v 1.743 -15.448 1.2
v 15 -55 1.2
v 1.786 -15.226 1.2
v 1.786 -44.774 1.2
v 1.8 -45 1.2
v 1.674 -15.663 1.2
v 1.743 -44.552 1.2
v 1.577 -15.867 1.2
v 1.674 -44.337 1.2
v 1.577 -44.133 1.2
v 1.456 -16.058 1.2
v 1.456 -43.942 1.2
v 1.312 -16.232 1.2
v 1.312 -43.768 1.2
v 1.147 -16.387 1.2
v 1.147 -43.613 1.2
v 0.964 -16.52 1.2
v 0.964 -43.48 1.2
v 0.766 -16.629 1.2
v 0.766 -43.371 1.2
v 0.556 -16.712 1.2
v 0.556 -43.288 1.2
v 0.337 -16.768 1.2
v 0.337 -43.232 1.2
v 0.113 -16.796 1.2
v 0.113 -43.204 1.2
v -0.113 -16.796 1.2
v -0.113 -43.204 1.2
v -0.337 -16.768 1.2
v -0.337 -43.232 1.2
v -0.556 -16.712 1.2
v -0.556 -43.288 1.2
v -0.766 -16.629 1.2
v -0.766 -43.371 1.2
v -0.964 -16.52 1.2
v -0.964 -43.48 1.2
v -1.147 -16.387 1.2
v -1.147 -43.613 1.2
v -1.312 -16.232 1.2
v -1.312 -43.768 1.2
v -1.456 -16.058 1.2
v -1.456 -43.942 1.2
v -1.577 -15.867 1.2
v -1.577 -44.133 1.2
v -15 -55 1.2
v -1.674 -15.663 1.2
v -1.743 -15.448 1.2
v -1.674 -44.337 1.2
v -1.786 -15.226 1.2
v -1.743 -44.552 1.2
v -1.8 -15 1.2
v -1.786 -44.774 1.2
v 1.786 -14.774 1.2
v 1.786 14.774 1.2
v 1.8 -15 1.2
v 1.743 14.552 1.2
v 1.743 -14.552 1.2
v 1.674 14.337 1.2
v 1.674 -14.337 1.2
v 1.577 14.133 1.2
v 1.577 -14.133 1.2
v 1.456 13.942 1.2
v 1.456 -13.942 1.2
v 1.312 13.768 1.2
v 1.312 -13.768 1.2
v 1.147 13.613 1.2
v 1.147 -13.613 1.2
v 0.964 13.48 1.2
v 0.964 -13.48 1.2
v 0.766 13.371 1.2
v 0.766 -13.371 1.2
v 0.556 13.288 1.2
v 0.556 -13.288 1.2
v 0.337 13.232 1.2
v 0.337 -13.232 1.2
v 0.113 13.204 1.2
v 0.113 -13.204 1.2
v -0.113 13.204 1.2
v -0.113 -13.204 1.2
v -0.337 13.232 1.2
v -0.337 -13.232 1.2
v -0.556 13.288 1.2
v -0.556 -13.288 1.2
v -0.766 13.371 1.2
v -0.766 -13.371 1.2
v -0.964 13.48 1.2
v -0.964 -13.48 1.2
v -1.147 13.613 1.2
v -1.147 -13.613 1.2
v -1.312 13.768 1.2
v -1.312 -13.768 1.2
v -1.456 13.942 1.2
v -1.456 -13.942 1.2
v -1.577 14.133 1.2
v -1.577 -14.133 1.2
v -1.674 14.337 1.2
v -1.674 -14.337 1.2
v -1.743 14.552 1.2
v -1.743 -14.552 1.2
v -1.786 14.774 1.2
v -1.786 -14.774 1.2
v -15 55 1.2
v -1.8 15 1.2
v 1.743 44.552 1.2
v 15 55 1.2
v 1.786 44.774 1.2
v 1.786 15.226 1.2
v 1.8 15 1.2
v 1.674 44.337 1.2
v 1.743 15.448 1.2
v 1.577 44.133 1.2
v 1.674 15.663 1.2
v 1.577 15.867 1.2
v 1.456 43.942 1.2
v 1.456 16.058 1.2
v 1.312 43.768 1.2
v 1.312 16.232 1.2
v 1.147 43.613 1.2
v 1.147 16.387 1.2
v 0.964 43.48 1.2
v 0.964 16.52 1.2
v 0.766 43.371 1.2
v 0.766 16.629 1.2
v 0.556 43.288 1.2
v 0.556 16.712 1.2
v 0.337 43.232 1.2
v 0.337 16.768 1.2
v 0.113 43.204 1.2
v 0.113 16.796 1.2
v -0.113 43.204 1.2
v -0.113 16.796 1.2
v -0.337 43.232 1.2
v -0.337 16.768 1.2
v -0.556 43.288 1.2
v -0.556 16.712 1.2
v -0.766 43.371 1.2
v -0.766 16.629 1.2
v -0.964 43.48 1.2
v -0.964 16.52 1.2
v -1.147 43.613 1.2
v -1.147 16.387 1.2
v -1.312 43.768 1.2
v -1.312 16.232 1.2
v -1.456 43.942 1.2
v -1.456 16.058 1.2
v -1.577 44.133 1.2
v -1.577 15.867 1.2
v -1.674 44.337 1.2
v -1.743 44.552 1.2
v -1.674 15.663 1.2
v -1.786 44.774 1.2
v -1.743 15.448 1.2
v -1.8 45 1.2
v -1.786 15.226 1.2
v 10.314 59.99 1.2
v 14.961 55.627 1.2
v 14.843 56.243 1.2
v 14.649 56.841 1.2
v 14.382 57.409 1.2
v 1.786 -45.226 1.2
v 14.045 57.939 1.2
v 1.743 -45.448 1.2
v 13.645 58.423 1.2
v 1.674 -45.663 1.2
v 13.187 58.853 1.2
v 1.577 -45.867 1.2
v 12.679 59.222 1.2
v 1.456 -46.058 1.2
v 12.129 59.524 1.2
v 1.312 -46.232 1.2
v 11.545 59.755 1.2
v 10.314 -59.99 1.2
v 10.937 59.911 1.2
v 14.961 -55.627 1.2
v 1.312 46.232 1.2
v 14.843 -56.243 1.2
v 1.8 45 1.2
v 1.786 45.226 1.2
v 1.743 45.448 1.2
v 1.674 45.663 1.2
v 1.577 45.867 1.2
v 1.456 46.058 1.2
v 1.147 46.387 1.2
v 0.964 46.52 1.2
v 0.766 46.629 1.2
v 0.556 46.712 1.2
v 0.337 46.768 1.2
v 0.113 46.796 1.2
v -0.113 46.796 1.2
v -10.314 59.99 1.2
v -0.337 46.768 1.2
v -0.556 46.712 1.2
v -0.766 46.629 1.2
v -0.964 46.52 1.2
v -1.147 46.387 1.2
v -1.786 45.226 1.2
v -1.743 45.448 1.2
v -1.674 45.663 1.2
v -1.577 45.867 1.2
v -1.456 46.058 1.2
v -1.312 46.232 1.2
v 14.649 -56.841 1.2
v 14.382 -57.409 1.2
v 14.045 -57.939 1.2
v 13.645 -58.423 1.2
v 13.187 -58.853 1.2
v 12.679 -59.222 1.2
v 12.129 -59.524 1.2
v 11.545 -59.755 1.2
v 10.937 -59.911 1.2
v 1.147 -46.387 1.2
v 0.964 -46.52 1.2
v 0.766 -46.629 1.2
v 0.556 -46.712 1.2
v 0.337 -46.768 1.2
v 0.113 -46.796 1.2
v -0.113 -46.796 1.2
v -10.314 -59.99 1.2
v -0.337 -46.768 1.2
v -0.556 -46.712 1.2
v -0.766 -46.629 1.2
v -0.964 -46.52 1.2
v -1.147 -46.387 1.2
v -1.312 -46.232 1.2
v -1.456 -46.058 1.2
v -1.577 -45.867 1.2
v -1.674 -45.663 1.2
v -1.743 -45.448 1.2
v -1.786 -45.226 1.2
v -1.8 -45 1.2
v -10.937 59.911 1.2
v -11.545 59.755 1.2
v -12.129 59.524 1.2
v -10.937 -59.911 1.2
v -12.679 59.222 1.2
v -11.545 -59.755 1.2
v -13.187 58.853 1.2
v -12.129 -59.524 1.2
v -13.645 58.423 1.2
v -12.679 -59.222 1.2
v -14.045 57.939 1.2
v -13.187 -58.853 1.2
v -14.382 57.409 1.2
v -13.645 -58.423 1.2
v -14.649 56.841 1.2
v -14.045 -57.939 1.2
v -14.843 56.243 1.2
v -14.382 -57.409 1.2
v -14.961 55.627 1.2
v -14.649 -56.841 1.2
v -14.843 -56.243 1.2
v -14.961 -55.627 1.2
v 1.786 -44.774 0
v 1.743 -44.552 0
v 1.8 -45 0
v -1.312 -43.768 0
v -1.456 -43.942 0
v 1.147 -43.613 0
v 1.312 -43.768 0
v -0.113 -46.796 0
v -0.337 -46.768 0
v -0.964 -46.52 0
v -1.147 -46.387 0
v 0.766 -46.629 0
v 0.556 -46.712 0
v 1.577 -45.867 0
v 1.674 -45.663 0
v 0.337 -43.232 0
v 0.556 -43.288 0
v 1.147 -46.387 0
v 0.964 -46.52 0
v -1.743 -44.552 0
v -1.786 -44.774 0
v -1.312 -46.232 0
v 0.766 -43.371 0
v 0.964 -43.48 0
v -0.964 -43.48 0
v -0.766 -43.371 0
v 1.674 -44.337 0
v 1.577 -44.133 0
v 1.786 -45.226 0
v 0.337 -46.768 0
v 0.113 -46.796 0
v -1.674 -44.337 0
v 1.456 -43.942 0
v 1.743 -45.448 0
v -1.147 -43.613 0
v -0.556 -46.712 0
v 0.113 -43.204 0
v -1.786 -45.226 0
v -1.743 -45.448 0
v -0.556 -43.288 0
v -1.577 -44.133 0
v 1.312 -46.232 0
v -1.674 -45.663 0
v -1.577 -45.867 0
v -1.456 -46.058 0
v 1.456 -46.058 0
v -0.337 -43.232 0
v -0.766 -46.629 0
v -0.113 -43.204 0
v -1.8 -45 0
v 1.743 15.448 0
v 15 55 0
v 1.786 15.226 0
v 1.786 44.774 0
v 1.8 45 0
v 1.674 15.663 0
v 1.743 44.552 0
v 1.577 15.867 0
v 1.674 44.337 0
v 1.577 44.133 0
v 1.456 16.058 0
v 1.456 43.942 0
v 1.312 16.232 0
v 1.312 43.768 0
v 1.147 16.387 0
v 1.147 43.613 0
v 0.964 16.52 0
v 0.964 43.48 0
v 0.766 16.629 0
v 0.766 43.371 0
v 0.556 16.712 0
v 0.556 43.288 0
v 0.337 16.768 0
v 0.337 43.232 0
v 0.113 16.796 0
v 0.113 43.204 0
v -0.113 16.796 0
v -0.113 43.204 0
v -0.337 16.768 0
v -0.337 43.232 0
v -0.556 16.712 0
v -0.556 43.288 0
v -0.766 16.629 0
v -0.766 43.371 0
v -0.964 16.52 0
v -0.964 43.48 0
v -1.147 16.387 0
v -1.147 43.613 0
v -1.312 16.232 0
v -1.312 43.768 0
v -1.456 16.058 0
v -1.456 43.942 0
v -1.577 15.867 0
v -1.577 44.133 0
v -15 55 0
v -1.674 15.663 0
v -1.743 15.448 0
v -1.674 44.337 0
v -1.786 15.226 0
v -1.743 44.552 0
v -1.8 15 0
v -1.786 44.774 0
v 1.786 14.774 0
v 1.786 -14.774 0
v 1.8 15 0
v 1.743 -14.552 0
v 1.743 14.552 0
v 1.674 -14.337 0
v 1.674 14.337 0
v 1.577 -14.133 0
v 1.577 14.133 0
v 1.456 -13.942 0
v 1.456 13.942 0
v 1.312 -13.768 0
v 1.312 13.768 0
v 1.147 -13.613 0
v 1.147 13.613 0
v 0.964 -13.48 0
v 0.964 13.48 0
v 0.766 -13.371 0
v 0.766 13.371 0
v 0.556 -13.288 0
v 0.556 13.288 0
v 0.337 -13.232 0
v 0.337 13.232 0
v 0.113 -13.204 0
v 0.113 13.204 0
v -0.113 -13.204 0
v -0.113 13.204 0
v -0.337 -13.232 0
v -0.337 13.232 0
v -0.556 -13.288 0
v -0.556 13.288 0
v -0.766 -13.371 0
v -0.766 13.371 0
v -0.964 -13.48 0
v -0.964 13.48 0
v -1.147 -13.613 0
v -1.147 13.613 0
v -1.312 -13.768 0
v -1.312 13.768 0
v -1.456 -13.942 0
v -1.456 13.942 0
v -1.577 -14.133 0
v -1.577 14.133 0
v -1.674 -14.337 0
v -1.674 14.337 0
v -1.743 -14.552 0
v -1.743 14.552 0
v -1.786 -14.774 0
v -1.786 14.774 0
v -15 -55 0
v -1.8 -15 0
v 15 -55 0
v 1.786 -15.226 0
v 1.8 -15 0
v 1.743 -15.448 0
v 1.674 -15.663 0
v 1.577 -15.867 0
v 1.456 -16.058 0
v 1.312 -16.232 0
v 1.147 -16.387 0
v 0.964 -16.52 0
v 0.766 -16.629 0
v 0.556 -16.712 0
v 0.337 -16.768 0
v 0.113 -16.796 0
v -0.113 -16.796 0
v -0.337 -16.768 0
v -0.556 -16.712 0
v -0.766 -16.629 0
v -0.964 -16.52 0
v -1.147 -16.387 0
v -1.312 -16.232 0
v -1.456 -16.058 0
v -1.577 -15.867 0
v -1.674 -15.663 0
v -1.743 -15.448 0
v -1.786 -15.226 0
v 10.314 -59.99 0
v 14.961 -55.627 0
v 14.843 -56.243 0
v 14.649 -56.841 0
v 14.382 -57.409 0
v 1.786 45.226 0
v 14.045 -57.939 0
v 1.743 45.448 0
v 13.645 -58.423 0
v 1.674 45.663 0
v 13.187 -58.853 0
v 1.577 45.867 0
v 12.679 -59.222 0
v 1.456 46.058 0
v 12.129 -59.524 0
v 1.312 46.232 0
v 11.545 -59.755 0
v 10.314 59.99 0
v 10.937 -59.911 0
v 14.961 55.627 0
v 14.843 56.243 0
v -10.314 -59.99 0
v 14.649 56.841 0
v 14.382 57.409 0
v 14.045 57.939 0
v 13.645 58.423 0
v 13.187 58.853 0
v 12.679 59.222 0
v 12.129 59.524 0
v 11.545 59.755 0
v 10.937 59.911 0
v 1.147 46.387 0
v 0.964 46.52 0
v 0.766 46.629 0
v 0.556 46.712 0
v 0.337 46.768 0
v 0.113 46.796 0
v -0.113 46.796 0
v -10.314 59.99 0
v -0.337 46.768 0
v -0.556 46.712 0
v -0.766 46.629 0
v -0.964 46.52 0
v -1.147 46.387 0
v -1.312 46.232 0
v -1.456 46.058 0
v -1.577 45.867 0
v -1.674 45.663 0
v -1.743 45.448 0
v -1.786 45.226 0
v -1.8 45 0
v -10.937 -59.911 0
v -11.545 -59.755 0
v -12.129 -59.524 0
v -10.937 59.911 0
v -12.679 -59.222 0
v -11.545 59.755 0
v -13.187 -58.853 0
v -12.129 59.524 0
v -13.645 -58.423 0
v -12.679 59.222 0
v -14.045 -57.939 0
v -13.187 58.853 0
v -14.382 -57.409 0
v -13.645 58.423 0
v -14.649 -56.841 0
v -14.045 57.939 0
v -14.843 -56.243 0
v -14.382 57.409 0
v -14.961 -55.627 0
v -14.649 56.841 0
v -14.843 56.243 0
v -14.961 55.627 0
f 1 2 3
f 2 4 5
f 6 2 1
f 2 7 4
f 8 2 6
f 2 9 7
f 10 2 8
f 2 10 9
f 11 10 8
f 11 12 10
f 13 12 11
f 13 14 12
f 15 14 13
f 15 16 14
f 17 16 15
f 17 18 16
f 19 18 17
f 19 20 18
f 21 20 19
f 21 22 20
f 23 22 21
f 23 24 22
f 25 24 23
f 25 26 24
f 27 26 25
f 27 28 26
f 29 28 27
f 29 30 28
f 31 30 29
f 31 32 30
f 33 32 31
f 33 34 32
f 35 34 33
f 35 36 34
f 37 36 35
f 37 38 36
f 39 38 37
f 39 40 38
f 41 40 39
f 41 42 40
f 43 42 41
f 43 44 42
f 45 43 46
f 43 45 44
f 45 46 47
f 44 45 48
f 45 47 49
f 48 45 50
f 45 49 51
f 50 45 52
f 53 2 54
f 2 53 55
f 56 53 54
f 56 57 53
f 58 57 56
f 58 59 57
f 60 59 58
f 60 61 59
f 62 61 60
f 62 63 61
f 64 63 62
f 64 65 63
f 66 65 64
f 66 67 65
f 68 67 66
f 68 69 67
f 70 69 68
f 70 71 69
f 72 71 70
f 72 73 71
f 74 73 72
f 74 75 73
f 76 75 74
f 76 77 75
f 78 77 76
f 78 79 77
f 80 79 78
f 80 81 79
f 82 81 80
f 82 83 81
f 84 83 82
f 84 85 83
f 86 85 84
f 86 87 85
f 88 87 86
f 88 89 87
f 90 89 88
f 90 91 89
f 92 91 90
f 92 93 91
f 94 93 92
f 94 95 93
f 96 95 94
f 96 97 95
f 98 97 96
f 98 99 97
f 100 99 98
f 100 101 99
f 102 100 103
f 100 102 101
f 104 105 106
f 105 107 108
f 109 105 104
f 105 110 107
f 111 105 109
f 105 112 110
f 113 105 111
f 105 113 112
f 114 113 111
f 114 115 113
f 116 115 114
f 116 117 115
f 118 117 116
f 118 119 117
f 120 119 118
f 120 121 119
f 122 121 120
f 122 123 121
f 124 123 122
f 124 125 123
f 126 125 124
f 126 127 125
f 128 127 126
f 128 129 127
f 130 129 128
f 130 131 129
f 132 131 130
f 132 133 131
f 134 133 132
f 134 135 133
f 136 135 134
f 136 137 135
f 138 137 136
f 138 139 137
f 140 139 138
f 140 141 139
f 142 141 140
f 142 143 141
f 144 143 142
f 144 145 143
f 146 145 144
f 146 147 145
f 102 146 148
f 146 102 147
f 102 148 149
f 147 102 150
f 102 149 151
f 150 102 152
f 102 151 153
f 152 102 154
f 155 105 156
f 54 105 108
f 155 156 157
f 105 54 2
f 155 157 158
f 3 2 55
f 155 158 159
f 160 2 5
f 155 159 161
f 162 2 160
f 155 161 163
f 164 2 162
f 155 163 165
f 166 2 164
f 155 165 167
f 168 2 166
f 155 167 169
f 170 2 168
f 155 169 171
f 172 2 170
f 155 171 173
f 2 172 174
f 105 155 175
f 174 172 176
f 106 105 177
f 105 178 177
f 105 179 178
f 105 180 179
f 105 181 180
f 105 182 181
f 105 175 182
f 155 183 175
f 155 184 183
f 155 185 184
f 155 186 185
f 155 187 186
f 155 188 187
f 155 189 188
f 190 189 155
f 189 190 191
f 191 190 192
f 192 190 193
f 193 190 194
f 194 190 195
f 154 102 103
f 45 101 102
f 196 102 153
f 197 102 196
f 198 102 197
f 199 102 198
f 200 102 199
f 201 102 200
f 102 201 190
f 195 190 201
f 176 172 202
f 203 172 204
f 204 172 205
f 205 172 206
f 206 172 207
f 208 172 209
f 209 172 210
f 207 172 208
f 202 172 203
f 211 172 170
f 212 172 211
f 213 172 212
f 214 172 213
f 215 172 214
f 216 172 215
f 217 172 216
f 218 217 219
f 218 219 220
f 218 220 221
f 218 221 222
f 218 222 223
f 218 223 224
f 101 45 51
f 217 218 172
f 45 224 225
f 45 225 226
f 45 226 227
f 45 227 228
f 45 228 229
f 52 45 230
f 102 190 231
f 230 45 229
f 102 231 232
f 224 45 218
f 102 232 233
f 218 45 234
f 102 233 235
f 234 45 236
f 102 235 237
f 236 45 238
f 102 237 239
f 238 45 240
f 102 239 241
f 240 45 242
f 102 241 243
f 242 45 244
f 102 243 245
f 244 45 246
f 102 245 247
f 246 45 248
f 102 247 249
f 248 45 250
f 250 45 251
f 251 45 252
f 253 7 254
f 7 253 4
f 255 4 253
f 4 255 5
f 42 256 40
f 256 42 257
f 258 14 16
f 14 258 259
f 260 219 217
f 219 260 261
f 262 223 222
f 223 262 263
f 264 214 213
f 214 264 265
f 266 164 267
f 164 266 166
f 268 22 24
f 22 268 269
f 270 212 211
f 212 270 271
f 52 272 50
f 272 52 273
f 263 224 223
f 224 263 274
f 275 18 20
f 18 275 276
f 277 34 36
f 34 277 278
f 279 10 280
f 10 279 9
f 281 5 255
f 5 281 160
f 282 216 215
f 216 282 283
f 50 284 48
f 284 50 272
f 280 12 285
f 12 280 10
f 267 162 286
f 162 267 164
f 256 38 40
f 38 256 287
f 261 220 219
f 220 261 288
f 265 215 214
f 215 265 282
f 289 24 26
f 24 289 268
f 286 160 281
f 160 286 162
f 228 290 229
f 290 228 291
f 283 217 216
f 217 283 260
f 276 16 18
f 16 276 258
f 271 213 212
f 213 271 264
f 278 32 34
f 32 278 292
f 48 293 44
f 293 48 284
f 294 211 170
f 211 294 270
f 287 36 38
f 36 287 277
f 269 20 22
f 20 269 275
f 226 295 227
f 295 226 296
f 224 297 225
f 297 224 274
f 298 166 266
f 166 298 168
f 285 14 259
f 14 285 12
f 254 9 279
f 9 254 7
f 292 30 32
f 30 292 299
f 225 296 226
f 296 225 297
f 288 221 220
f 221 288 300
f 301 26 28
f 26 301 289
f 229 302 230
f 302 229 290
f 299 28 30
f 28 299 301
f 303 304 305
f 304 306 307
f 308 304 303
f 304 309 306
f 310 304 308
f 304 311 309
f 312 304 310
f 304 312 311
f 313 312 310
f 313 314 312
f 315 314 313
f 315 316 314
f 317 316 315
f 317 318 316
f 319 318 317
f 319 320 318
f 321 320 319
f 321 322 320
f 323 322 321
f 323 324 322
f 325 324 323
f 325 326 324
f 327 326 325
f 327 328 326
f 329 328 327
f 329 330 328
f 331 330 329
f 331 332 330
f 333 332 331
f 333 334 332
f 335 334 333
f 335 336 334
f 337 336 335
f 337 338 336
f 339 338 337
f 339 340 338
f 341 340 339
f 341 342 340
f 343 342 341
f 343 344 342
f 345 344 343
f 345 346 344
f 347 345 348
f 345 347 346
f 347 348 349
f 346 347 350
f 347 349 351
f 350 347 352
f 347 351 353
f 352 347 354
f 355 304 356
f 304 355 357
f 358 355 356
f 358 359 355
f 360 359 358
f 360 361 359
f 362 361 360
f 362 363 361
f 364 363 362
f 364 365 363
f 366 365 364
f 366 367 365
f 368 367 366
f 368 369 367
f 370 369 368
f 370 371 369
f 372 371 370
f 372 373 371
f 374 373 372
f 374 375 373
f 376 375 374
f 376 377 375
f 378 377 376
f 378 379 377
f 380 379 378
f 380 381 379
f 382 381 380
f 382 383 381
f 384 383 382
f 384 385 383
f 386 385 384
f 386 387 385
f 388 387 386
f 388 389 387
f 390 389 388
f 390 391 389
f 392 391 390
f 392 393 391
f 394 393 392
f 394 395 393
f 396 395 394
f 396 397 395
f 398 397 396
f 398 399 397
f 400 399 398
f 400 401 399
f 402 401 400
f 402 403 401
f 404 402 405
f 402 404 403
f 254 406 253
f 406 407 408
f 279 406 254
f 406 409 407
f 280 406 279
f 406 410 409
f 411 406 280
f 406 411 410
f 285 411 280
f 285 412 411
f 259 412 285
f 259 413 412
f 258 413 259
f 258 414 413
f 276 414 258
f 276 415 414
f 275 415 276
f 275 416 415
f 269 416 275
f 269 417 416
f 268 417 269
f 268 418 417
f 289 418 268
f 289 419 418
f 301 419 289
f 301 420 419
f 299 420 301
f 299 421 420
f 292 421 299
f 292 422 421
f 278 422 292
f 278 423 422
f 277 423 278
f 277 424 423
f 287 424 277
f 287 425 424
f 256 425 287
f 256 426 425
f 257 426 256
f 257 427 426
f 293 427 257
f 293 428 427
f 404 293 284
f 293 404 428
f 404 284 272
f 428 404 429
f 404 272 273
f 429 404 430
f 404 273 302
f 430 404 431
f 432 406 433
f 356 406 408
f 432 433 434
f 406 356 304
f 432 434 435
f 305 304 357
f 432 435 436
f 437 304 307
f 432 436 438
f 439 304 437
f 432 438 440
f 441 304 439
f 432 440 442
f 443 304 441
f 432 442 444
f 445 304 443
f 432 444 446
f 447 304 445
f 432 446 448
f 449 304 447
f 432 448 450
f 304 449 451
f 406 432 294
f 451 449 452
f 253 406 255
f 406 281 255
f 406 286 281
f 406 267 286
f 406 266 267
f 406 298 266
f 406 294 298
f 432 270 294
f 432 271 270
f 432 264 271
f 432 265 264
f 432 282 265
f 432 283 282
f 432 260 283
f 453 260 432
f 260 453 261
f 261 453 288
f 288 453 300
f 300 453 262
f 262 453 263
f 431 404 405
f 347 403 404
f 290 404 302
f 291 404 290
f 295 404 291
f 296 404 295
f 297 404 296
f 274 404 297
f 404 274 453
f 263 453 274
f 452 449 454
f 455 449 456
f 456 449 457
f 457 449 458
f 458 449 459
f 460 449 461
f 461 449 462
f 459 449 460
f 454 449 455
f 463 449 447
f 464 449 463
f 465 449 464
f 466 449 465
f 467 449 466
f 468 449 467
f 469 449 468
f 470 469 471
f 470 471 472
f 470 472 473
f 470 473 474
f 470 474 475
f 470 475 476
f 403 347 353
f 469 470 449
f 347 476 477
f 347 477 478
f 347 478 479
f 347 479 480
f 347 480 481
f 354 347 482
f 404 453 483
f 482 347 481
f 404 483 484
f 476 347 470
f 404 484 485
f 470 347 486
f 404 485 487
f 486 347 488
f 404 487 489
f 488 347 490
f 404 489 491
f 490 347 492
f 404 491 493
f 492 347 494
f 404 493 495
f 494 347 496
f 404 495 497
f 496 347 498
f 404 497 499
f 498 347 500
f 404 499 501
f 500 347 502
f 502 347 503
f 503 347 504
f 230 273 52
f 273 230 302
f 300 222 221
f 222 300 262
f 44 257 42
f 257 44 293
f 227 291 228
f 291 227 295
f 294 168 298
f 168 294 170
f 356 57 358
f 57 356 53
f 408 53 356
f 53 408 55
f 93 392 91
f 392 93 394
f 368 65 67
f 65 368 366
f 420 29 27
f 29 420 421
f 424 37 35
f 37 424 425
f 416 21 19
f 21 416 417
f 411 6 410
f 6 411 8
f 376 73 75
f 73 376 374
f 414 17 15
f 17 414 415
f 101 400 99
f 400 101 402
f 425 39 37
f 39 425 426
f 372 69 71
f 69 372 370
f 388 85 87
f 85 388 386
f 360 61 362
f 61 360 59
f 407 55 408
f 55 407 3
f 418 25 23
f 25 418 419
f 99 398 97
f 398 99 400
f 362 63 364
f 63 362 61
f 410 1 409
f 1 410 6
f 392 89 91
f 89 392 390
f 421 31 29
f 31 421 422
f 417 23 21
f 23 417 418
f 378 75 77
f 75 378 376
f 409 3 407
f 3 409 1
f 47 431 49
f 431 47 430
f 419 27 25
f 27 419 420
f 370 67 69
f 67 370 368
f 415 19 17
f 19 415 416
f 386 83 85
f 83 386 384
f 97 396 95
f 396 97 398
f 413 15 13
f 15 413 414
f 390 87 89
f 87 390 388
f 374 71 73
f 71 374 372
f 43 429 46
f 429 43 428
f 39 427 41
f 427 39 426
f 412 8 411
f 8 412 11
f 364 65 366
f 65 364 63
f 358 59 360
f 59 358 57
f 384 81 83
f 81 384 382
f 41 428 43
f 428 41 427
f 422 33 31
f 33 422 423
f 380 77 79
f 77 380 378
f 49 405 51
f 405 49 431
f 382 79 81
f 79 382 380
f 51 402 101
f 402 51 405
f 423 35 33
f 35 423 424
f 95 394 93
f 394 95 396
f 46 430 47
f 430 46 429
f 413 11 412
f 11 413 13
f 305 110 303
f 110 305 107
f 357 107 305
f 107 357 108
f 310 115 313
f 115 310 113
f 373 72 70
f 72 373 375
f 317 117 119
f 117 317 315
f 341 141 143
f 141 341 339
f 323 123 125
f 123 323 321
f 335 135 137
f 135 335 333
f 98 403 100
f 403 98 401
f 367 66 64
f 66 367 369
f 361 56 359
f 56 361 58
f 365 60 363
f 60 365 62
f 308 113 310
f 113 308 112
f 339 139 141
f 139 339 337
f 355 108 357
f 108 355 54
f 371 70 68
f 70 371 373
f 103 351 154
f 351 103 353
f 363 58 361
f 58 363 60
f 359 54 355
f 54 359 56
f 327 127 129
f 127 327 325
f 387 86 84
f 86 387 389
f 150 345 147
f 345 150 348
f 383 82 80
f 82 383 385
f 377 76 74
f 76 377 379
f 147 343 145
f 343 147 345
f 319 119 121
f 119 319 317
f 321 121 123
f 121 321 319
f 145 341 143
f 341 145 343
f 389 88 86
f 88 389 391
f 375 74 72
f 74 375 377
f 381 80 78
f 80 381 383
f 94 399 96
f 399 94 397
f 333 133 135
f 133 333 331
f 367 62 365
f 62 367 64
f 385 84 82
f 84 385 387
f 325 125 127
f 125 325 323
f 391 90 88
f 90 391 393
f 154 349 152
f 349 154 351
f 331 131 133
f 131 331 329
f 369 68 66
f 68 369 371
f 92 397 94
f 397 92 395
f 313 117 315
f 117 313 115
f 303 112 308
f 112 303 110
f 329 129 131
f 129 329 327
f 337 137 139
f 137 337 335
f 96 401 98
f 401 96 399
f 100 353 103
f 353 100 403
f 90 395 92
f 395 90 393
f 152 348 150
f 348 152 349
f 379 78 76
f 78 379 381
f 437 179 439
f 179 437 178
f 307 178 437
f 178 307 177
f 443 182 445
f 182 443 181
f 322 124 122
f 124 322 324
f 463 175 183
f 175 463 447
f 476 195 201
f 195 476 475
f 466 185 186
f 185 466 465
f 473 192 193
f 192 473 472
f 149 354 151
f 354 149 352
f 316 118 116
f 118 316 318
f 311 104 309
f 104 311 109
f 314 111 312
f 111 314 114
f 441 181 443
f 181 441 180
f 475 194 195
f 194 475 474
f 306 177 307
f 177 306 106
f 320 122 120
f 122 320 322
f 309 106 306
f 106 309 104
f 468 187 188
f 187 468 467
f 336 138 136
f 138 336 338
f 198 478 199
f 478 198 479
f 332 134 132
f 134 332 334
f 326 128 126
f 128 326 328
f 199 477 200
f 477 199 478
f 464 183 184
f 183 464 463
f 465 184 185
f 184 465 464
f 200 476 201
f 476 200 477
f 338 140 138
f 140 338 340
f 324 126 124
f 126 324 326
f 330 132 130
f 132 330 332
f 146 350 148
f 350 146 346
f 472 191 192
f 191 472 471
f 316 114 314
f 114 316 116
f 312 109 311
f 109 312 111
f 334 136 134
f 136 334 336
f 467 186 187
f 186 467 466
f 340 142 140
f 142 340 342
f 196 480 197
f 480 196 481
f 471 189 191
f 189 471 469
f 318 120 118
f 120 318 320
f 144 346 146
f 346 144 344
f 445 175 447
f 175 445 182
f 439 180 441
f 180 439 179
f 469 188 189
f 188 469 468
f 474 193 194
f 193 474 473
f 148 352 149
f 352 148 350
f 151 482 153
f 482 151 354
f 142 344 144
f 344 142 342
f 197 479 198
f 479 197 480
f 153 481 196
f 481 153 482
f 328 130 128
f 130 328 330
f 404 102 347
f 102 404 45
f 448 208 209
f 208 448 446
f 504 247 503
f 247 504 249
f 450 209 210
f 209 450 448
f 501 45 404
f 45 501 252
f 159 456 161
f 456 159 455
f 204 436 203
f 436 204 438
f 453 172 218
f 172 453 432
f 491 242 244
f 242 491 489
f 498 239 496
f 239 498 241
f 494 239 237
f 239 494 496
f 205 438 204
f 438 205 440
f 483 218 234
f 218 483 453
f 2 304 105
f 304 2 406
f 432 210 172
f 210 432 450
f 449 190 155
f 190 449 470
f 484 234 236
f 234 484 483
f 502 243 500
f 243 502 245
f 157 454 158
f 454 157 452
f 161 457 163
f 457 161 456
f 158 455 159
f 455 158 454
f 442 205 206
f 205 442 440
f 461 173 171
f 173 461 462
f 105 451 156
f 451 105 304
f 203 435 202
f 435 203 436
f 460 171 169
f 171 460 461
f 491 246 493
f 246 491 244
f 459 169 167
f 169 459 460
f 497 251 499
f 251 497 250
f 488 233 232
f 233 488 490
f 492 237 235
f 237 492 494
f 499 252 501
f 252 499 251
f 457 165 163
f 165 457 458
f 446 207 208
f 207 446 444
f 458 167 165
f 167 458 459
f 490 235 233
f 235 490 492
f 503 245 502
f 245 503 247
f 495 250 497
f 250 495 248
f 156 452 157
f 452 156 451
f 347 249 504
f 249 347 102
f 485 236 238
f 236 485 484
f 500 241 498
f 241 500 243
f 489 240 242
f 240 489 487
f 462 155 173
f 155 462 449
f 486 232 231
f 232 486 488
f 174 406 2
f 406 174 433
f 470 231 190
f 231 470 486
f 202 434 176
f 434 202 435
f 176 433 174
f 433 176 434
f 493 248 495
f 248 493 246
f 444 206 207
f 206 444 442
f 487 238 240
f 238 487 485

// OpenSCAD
$fn = 50;


difference() {
	union() {
		hull() {
			translate(v = [-10.0000000000, 55.0000000000, 0]) {
				cylinder(h = 24, r = 5);
			}
			translate(v = [10.0000000000, 55.0000000000, 0]) {
				cylinder(h = 24, r = 5);
			}
			translate(v = [-10.0000000000, -55.0000000000, 0]) {
				cylinder(h = 24, r = 5);
			}
			translate(v = [10.0000000000, -55.0000000000, 0]) {
				cylinder(h = 24, r = 5);
			}
		}
	}
	union() {
		translate(v = [0, 0, 1.2000000000]) {
			hull() {
				translate(v = [-10.0000000000, 55.0000000000, 0]) {
					cylinder(h = 22.8000000000, r = 3.8000000000);
				}
				translate(v = [10.0000000000, 55.0000000000, 0]) {
					cylinder(h = 22.8000000000, r = 3.8000000000);
				}
				translate(v = [-10.0000000000, -55.0000000000, 0]) {
					cylinder(h = 22.8000000000, r = 3.8000000000);
				}
				translate(v = [10.0000000000, -55.0000000000, 0]) {
					cylinder(h = 22.8000000000, r = 3.8000000000);
				}
			}
		}
		#translate(v = [0.0000000000, -45.0000000000, 0]) {
			cylinder(h = 1.2000000000, r = 1.8000000000);
		}
		#translate(v = [0.0000000000, -15.0000000000, 0]) {
			cylinder(h = 1.2000000000, r = 1.8000000000);
		}
		#translate(v = [0.0000000000, 15.0000000000, 0]) {
			cylinder(h = 1.2000000000, r = 1.8000000000);
		}
		#translate(v = [0.0000000000, 45.0000000000, 0]) {
			cylinder(h = 1.2000000000, r = 1.8000000000);
		}
		translate(v = [-250.0000000000, -250.0000000000, 1.2000000000]) {
			cube(size = [500, 500, 500]);
		}
		translate(v = [-250.0000000000, -250.0000000000, 1.2000000000]) {
			cube(size = [500, 500, 500]);
		}
		translate(v = [-250.0000000000, -250.0000000000, 1.2000000000]) {
			cube(size = [500, 500, 500]);
		}
	}
}
